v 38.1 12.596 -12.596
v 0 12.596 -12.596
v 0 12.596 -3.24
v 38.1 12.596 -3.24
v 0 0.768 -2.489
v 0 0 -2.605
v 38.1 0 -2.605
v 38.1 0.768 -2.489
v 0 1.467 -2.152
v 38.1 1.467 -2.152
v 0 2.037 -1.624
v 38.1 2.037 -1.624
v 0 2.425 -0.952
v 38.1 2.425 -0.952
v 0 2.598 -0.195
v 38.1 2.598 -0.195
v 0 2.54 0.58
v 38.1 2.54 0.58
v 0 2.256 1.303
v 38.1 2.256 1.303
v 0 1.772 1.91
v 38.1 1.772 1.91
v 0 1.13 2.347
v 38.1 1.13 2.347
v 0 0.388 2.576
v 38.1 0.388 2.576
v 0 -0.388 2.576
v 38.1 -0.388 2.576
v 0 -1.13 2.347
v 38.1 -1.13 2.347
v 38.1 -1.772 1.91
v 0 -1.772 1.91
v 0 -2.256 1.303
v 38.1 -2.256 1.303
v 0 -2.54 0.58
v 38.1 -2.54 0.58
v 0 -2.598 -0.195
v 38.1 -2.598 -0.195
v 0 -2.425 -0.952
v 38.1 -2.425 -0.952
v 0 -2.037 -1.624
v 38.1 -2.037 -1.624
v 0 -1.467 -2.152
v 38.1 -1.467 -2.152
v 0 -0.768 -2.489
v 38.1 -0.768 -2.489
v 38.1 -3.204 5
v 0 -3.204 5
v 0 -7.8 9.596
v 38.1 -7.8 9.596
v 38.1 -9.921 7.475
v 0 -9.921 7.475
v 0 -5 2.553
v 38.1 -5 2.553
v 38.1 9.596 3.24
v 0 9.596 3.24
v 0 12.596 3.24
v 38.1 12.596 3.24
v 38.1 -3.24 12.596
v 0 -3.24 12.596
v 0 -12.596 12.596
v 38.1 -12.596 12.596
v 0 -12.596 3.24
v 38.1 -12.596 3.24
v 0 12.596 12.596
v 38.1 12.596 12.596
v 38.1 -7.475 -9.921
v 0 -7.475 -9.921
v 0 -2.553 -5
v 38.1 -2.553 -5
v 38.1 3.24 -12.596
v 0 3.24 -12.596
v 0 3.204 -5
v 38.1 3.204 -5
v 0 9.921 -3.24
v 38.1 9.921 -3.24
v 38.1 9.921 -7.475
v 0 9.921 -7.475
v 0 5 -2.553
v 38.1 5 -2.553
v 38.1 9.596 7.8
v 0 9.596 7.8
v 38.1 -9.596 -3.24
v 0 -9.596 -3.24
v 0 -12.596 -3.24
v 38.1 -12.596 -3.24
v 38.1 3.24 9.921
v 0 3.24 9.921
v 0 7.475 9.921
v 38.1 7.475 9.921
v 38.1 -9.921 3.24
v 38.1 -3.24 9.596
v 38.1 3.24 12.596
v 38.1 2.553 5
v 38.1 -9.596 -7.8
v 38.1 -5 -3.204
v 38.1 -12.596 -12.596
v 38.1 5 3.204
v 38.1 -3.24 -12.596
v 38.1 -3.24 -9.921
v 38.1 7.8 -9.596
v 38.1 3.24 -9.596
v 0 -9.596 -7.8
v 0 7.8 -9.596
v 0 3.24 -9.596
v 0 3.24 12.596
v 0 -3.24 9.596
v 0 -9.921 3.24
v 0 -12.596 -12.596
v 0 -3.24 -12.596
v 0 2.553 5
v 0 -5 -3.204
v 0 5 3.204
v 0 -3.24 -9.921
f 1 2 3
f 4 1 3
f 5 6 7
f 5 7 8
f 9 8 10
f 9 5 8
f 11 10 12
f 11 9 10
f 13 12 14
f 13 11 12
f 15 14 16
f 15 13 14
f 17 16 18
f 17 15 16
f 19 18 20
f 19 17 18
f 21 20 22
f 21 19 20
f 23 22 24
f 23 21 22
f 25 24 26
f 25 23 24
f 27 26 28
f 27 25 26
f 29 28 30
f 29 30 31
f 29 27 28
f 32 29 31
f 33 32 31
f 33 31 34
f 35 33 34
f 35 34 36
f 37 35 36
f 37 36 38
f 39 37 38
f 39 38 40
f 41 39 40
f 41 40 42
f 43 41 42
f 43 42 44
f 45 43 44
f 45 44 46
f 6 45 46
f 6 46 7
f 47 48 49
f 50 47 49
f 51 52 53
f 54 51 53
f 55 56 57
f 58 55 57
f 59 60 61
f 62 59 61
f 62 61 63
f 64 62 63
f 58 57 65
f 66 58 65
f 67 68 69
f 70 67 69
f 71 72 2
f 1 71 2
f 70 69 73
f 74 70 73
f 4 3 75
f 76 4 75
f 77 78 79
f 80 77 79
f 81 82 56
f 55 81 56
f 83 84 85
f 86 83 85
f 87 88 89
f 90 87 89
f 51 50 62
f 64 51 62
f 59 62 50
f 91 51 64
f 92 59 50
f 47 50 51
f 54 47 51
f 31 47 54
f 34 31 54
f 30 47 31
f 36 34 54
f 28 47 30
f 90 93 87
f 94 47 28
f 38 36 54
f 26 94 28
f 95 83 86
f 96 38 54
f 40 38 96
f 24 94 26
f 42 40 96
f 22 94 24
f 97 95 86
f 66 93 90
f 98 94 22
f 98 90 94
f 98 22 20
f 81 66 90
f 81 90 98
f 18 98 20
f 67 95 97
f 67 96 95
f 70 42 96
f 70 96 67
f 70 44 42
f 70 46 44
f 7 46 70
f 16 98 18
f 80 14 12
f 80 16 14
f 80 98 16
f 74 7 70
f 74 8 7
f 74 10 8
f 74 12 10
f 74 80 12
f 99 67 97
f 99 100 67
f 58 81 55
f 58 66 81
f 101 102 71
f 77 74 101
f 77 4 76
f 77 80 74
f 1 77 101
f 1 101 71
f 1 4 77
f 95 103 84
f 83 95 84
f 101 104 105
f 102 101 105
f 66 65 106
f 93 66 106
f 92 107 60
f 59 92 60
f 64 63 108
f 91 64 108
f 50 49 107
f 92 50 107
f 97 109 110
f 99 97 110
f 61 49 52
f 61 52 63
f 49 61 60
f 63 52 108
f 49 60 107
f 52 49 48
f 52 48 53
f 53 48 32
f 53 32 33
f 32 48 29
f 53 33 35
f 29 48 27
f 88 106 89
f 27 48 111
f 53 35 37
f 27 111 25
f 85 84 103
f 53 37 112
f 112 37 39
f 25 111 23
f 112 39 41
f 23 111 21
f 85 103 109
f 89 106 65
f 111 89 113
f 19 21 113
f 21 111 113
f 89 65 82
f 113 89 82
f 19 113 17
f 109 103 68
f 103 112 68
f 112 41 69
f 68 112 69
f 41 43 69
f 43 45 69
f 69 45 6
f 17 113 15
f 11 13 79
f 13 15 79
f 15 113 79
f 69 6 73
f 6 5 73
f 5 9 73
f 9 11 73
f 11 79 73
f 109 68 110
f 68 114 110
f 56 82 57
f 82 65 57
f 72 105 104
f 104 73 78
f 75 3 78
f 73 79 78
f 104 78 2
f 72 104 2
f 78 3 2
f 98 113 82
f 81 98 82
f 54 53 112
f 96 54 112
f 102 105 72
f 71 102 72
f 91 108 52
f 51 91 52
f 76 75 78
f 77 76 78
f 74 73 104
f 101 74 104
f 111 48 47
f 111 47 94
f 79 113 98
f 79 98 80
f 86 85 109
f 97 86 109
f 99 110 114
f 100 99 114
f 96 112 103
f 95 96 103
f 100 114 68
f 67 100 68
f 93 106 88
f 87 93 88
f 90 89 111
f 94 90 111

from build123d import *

# Parameters (mm, degrees)
SKETCH1_R           = 2.605
BOSS_EXTRUDE1_DEPTH = 38.1
CIRPATTERN1_COUNT   = 4


with BuildPart() as part:
    # Sketch1 → Boss-Extrude1 (new body)
    with BuildSketch(Plane(origin=(0, 0, 0), x_dir=(0, 0, -1), z_dir=(1, 0, 0))):
        Polygon((5, -5), (5, 3.203948776), (9.596194078, 7.800142853), (9.596194078, 3.24), (12.596194078, 3.24), (12.596194078, 12.596194078), (3.24, 12.596194078), (3.24, 9.921463197), (7.474873734, 9.921463197), (2.553410537, 5), (-5, 5), (-5, -5), align=None)
        Circle(SKETCH1_R, mode=Mode.SUBTRACT)
    boss_extrude1 = extrude(amount=BOSS_EXTRUDE1_DEPTH)

    # CirPattern1: Boss-Extrude1 ×4 about axis
    cirpattern1_axis = Axis((0, 0, 0), (1, 0, 0))
    for i in range(1, CIRPATTERN1_COUNT):
        add(boss_extrude1.rotate(cirpattern1_axis, i * 360 / CIRPATTERN1_COUNT))


solid = part.part
